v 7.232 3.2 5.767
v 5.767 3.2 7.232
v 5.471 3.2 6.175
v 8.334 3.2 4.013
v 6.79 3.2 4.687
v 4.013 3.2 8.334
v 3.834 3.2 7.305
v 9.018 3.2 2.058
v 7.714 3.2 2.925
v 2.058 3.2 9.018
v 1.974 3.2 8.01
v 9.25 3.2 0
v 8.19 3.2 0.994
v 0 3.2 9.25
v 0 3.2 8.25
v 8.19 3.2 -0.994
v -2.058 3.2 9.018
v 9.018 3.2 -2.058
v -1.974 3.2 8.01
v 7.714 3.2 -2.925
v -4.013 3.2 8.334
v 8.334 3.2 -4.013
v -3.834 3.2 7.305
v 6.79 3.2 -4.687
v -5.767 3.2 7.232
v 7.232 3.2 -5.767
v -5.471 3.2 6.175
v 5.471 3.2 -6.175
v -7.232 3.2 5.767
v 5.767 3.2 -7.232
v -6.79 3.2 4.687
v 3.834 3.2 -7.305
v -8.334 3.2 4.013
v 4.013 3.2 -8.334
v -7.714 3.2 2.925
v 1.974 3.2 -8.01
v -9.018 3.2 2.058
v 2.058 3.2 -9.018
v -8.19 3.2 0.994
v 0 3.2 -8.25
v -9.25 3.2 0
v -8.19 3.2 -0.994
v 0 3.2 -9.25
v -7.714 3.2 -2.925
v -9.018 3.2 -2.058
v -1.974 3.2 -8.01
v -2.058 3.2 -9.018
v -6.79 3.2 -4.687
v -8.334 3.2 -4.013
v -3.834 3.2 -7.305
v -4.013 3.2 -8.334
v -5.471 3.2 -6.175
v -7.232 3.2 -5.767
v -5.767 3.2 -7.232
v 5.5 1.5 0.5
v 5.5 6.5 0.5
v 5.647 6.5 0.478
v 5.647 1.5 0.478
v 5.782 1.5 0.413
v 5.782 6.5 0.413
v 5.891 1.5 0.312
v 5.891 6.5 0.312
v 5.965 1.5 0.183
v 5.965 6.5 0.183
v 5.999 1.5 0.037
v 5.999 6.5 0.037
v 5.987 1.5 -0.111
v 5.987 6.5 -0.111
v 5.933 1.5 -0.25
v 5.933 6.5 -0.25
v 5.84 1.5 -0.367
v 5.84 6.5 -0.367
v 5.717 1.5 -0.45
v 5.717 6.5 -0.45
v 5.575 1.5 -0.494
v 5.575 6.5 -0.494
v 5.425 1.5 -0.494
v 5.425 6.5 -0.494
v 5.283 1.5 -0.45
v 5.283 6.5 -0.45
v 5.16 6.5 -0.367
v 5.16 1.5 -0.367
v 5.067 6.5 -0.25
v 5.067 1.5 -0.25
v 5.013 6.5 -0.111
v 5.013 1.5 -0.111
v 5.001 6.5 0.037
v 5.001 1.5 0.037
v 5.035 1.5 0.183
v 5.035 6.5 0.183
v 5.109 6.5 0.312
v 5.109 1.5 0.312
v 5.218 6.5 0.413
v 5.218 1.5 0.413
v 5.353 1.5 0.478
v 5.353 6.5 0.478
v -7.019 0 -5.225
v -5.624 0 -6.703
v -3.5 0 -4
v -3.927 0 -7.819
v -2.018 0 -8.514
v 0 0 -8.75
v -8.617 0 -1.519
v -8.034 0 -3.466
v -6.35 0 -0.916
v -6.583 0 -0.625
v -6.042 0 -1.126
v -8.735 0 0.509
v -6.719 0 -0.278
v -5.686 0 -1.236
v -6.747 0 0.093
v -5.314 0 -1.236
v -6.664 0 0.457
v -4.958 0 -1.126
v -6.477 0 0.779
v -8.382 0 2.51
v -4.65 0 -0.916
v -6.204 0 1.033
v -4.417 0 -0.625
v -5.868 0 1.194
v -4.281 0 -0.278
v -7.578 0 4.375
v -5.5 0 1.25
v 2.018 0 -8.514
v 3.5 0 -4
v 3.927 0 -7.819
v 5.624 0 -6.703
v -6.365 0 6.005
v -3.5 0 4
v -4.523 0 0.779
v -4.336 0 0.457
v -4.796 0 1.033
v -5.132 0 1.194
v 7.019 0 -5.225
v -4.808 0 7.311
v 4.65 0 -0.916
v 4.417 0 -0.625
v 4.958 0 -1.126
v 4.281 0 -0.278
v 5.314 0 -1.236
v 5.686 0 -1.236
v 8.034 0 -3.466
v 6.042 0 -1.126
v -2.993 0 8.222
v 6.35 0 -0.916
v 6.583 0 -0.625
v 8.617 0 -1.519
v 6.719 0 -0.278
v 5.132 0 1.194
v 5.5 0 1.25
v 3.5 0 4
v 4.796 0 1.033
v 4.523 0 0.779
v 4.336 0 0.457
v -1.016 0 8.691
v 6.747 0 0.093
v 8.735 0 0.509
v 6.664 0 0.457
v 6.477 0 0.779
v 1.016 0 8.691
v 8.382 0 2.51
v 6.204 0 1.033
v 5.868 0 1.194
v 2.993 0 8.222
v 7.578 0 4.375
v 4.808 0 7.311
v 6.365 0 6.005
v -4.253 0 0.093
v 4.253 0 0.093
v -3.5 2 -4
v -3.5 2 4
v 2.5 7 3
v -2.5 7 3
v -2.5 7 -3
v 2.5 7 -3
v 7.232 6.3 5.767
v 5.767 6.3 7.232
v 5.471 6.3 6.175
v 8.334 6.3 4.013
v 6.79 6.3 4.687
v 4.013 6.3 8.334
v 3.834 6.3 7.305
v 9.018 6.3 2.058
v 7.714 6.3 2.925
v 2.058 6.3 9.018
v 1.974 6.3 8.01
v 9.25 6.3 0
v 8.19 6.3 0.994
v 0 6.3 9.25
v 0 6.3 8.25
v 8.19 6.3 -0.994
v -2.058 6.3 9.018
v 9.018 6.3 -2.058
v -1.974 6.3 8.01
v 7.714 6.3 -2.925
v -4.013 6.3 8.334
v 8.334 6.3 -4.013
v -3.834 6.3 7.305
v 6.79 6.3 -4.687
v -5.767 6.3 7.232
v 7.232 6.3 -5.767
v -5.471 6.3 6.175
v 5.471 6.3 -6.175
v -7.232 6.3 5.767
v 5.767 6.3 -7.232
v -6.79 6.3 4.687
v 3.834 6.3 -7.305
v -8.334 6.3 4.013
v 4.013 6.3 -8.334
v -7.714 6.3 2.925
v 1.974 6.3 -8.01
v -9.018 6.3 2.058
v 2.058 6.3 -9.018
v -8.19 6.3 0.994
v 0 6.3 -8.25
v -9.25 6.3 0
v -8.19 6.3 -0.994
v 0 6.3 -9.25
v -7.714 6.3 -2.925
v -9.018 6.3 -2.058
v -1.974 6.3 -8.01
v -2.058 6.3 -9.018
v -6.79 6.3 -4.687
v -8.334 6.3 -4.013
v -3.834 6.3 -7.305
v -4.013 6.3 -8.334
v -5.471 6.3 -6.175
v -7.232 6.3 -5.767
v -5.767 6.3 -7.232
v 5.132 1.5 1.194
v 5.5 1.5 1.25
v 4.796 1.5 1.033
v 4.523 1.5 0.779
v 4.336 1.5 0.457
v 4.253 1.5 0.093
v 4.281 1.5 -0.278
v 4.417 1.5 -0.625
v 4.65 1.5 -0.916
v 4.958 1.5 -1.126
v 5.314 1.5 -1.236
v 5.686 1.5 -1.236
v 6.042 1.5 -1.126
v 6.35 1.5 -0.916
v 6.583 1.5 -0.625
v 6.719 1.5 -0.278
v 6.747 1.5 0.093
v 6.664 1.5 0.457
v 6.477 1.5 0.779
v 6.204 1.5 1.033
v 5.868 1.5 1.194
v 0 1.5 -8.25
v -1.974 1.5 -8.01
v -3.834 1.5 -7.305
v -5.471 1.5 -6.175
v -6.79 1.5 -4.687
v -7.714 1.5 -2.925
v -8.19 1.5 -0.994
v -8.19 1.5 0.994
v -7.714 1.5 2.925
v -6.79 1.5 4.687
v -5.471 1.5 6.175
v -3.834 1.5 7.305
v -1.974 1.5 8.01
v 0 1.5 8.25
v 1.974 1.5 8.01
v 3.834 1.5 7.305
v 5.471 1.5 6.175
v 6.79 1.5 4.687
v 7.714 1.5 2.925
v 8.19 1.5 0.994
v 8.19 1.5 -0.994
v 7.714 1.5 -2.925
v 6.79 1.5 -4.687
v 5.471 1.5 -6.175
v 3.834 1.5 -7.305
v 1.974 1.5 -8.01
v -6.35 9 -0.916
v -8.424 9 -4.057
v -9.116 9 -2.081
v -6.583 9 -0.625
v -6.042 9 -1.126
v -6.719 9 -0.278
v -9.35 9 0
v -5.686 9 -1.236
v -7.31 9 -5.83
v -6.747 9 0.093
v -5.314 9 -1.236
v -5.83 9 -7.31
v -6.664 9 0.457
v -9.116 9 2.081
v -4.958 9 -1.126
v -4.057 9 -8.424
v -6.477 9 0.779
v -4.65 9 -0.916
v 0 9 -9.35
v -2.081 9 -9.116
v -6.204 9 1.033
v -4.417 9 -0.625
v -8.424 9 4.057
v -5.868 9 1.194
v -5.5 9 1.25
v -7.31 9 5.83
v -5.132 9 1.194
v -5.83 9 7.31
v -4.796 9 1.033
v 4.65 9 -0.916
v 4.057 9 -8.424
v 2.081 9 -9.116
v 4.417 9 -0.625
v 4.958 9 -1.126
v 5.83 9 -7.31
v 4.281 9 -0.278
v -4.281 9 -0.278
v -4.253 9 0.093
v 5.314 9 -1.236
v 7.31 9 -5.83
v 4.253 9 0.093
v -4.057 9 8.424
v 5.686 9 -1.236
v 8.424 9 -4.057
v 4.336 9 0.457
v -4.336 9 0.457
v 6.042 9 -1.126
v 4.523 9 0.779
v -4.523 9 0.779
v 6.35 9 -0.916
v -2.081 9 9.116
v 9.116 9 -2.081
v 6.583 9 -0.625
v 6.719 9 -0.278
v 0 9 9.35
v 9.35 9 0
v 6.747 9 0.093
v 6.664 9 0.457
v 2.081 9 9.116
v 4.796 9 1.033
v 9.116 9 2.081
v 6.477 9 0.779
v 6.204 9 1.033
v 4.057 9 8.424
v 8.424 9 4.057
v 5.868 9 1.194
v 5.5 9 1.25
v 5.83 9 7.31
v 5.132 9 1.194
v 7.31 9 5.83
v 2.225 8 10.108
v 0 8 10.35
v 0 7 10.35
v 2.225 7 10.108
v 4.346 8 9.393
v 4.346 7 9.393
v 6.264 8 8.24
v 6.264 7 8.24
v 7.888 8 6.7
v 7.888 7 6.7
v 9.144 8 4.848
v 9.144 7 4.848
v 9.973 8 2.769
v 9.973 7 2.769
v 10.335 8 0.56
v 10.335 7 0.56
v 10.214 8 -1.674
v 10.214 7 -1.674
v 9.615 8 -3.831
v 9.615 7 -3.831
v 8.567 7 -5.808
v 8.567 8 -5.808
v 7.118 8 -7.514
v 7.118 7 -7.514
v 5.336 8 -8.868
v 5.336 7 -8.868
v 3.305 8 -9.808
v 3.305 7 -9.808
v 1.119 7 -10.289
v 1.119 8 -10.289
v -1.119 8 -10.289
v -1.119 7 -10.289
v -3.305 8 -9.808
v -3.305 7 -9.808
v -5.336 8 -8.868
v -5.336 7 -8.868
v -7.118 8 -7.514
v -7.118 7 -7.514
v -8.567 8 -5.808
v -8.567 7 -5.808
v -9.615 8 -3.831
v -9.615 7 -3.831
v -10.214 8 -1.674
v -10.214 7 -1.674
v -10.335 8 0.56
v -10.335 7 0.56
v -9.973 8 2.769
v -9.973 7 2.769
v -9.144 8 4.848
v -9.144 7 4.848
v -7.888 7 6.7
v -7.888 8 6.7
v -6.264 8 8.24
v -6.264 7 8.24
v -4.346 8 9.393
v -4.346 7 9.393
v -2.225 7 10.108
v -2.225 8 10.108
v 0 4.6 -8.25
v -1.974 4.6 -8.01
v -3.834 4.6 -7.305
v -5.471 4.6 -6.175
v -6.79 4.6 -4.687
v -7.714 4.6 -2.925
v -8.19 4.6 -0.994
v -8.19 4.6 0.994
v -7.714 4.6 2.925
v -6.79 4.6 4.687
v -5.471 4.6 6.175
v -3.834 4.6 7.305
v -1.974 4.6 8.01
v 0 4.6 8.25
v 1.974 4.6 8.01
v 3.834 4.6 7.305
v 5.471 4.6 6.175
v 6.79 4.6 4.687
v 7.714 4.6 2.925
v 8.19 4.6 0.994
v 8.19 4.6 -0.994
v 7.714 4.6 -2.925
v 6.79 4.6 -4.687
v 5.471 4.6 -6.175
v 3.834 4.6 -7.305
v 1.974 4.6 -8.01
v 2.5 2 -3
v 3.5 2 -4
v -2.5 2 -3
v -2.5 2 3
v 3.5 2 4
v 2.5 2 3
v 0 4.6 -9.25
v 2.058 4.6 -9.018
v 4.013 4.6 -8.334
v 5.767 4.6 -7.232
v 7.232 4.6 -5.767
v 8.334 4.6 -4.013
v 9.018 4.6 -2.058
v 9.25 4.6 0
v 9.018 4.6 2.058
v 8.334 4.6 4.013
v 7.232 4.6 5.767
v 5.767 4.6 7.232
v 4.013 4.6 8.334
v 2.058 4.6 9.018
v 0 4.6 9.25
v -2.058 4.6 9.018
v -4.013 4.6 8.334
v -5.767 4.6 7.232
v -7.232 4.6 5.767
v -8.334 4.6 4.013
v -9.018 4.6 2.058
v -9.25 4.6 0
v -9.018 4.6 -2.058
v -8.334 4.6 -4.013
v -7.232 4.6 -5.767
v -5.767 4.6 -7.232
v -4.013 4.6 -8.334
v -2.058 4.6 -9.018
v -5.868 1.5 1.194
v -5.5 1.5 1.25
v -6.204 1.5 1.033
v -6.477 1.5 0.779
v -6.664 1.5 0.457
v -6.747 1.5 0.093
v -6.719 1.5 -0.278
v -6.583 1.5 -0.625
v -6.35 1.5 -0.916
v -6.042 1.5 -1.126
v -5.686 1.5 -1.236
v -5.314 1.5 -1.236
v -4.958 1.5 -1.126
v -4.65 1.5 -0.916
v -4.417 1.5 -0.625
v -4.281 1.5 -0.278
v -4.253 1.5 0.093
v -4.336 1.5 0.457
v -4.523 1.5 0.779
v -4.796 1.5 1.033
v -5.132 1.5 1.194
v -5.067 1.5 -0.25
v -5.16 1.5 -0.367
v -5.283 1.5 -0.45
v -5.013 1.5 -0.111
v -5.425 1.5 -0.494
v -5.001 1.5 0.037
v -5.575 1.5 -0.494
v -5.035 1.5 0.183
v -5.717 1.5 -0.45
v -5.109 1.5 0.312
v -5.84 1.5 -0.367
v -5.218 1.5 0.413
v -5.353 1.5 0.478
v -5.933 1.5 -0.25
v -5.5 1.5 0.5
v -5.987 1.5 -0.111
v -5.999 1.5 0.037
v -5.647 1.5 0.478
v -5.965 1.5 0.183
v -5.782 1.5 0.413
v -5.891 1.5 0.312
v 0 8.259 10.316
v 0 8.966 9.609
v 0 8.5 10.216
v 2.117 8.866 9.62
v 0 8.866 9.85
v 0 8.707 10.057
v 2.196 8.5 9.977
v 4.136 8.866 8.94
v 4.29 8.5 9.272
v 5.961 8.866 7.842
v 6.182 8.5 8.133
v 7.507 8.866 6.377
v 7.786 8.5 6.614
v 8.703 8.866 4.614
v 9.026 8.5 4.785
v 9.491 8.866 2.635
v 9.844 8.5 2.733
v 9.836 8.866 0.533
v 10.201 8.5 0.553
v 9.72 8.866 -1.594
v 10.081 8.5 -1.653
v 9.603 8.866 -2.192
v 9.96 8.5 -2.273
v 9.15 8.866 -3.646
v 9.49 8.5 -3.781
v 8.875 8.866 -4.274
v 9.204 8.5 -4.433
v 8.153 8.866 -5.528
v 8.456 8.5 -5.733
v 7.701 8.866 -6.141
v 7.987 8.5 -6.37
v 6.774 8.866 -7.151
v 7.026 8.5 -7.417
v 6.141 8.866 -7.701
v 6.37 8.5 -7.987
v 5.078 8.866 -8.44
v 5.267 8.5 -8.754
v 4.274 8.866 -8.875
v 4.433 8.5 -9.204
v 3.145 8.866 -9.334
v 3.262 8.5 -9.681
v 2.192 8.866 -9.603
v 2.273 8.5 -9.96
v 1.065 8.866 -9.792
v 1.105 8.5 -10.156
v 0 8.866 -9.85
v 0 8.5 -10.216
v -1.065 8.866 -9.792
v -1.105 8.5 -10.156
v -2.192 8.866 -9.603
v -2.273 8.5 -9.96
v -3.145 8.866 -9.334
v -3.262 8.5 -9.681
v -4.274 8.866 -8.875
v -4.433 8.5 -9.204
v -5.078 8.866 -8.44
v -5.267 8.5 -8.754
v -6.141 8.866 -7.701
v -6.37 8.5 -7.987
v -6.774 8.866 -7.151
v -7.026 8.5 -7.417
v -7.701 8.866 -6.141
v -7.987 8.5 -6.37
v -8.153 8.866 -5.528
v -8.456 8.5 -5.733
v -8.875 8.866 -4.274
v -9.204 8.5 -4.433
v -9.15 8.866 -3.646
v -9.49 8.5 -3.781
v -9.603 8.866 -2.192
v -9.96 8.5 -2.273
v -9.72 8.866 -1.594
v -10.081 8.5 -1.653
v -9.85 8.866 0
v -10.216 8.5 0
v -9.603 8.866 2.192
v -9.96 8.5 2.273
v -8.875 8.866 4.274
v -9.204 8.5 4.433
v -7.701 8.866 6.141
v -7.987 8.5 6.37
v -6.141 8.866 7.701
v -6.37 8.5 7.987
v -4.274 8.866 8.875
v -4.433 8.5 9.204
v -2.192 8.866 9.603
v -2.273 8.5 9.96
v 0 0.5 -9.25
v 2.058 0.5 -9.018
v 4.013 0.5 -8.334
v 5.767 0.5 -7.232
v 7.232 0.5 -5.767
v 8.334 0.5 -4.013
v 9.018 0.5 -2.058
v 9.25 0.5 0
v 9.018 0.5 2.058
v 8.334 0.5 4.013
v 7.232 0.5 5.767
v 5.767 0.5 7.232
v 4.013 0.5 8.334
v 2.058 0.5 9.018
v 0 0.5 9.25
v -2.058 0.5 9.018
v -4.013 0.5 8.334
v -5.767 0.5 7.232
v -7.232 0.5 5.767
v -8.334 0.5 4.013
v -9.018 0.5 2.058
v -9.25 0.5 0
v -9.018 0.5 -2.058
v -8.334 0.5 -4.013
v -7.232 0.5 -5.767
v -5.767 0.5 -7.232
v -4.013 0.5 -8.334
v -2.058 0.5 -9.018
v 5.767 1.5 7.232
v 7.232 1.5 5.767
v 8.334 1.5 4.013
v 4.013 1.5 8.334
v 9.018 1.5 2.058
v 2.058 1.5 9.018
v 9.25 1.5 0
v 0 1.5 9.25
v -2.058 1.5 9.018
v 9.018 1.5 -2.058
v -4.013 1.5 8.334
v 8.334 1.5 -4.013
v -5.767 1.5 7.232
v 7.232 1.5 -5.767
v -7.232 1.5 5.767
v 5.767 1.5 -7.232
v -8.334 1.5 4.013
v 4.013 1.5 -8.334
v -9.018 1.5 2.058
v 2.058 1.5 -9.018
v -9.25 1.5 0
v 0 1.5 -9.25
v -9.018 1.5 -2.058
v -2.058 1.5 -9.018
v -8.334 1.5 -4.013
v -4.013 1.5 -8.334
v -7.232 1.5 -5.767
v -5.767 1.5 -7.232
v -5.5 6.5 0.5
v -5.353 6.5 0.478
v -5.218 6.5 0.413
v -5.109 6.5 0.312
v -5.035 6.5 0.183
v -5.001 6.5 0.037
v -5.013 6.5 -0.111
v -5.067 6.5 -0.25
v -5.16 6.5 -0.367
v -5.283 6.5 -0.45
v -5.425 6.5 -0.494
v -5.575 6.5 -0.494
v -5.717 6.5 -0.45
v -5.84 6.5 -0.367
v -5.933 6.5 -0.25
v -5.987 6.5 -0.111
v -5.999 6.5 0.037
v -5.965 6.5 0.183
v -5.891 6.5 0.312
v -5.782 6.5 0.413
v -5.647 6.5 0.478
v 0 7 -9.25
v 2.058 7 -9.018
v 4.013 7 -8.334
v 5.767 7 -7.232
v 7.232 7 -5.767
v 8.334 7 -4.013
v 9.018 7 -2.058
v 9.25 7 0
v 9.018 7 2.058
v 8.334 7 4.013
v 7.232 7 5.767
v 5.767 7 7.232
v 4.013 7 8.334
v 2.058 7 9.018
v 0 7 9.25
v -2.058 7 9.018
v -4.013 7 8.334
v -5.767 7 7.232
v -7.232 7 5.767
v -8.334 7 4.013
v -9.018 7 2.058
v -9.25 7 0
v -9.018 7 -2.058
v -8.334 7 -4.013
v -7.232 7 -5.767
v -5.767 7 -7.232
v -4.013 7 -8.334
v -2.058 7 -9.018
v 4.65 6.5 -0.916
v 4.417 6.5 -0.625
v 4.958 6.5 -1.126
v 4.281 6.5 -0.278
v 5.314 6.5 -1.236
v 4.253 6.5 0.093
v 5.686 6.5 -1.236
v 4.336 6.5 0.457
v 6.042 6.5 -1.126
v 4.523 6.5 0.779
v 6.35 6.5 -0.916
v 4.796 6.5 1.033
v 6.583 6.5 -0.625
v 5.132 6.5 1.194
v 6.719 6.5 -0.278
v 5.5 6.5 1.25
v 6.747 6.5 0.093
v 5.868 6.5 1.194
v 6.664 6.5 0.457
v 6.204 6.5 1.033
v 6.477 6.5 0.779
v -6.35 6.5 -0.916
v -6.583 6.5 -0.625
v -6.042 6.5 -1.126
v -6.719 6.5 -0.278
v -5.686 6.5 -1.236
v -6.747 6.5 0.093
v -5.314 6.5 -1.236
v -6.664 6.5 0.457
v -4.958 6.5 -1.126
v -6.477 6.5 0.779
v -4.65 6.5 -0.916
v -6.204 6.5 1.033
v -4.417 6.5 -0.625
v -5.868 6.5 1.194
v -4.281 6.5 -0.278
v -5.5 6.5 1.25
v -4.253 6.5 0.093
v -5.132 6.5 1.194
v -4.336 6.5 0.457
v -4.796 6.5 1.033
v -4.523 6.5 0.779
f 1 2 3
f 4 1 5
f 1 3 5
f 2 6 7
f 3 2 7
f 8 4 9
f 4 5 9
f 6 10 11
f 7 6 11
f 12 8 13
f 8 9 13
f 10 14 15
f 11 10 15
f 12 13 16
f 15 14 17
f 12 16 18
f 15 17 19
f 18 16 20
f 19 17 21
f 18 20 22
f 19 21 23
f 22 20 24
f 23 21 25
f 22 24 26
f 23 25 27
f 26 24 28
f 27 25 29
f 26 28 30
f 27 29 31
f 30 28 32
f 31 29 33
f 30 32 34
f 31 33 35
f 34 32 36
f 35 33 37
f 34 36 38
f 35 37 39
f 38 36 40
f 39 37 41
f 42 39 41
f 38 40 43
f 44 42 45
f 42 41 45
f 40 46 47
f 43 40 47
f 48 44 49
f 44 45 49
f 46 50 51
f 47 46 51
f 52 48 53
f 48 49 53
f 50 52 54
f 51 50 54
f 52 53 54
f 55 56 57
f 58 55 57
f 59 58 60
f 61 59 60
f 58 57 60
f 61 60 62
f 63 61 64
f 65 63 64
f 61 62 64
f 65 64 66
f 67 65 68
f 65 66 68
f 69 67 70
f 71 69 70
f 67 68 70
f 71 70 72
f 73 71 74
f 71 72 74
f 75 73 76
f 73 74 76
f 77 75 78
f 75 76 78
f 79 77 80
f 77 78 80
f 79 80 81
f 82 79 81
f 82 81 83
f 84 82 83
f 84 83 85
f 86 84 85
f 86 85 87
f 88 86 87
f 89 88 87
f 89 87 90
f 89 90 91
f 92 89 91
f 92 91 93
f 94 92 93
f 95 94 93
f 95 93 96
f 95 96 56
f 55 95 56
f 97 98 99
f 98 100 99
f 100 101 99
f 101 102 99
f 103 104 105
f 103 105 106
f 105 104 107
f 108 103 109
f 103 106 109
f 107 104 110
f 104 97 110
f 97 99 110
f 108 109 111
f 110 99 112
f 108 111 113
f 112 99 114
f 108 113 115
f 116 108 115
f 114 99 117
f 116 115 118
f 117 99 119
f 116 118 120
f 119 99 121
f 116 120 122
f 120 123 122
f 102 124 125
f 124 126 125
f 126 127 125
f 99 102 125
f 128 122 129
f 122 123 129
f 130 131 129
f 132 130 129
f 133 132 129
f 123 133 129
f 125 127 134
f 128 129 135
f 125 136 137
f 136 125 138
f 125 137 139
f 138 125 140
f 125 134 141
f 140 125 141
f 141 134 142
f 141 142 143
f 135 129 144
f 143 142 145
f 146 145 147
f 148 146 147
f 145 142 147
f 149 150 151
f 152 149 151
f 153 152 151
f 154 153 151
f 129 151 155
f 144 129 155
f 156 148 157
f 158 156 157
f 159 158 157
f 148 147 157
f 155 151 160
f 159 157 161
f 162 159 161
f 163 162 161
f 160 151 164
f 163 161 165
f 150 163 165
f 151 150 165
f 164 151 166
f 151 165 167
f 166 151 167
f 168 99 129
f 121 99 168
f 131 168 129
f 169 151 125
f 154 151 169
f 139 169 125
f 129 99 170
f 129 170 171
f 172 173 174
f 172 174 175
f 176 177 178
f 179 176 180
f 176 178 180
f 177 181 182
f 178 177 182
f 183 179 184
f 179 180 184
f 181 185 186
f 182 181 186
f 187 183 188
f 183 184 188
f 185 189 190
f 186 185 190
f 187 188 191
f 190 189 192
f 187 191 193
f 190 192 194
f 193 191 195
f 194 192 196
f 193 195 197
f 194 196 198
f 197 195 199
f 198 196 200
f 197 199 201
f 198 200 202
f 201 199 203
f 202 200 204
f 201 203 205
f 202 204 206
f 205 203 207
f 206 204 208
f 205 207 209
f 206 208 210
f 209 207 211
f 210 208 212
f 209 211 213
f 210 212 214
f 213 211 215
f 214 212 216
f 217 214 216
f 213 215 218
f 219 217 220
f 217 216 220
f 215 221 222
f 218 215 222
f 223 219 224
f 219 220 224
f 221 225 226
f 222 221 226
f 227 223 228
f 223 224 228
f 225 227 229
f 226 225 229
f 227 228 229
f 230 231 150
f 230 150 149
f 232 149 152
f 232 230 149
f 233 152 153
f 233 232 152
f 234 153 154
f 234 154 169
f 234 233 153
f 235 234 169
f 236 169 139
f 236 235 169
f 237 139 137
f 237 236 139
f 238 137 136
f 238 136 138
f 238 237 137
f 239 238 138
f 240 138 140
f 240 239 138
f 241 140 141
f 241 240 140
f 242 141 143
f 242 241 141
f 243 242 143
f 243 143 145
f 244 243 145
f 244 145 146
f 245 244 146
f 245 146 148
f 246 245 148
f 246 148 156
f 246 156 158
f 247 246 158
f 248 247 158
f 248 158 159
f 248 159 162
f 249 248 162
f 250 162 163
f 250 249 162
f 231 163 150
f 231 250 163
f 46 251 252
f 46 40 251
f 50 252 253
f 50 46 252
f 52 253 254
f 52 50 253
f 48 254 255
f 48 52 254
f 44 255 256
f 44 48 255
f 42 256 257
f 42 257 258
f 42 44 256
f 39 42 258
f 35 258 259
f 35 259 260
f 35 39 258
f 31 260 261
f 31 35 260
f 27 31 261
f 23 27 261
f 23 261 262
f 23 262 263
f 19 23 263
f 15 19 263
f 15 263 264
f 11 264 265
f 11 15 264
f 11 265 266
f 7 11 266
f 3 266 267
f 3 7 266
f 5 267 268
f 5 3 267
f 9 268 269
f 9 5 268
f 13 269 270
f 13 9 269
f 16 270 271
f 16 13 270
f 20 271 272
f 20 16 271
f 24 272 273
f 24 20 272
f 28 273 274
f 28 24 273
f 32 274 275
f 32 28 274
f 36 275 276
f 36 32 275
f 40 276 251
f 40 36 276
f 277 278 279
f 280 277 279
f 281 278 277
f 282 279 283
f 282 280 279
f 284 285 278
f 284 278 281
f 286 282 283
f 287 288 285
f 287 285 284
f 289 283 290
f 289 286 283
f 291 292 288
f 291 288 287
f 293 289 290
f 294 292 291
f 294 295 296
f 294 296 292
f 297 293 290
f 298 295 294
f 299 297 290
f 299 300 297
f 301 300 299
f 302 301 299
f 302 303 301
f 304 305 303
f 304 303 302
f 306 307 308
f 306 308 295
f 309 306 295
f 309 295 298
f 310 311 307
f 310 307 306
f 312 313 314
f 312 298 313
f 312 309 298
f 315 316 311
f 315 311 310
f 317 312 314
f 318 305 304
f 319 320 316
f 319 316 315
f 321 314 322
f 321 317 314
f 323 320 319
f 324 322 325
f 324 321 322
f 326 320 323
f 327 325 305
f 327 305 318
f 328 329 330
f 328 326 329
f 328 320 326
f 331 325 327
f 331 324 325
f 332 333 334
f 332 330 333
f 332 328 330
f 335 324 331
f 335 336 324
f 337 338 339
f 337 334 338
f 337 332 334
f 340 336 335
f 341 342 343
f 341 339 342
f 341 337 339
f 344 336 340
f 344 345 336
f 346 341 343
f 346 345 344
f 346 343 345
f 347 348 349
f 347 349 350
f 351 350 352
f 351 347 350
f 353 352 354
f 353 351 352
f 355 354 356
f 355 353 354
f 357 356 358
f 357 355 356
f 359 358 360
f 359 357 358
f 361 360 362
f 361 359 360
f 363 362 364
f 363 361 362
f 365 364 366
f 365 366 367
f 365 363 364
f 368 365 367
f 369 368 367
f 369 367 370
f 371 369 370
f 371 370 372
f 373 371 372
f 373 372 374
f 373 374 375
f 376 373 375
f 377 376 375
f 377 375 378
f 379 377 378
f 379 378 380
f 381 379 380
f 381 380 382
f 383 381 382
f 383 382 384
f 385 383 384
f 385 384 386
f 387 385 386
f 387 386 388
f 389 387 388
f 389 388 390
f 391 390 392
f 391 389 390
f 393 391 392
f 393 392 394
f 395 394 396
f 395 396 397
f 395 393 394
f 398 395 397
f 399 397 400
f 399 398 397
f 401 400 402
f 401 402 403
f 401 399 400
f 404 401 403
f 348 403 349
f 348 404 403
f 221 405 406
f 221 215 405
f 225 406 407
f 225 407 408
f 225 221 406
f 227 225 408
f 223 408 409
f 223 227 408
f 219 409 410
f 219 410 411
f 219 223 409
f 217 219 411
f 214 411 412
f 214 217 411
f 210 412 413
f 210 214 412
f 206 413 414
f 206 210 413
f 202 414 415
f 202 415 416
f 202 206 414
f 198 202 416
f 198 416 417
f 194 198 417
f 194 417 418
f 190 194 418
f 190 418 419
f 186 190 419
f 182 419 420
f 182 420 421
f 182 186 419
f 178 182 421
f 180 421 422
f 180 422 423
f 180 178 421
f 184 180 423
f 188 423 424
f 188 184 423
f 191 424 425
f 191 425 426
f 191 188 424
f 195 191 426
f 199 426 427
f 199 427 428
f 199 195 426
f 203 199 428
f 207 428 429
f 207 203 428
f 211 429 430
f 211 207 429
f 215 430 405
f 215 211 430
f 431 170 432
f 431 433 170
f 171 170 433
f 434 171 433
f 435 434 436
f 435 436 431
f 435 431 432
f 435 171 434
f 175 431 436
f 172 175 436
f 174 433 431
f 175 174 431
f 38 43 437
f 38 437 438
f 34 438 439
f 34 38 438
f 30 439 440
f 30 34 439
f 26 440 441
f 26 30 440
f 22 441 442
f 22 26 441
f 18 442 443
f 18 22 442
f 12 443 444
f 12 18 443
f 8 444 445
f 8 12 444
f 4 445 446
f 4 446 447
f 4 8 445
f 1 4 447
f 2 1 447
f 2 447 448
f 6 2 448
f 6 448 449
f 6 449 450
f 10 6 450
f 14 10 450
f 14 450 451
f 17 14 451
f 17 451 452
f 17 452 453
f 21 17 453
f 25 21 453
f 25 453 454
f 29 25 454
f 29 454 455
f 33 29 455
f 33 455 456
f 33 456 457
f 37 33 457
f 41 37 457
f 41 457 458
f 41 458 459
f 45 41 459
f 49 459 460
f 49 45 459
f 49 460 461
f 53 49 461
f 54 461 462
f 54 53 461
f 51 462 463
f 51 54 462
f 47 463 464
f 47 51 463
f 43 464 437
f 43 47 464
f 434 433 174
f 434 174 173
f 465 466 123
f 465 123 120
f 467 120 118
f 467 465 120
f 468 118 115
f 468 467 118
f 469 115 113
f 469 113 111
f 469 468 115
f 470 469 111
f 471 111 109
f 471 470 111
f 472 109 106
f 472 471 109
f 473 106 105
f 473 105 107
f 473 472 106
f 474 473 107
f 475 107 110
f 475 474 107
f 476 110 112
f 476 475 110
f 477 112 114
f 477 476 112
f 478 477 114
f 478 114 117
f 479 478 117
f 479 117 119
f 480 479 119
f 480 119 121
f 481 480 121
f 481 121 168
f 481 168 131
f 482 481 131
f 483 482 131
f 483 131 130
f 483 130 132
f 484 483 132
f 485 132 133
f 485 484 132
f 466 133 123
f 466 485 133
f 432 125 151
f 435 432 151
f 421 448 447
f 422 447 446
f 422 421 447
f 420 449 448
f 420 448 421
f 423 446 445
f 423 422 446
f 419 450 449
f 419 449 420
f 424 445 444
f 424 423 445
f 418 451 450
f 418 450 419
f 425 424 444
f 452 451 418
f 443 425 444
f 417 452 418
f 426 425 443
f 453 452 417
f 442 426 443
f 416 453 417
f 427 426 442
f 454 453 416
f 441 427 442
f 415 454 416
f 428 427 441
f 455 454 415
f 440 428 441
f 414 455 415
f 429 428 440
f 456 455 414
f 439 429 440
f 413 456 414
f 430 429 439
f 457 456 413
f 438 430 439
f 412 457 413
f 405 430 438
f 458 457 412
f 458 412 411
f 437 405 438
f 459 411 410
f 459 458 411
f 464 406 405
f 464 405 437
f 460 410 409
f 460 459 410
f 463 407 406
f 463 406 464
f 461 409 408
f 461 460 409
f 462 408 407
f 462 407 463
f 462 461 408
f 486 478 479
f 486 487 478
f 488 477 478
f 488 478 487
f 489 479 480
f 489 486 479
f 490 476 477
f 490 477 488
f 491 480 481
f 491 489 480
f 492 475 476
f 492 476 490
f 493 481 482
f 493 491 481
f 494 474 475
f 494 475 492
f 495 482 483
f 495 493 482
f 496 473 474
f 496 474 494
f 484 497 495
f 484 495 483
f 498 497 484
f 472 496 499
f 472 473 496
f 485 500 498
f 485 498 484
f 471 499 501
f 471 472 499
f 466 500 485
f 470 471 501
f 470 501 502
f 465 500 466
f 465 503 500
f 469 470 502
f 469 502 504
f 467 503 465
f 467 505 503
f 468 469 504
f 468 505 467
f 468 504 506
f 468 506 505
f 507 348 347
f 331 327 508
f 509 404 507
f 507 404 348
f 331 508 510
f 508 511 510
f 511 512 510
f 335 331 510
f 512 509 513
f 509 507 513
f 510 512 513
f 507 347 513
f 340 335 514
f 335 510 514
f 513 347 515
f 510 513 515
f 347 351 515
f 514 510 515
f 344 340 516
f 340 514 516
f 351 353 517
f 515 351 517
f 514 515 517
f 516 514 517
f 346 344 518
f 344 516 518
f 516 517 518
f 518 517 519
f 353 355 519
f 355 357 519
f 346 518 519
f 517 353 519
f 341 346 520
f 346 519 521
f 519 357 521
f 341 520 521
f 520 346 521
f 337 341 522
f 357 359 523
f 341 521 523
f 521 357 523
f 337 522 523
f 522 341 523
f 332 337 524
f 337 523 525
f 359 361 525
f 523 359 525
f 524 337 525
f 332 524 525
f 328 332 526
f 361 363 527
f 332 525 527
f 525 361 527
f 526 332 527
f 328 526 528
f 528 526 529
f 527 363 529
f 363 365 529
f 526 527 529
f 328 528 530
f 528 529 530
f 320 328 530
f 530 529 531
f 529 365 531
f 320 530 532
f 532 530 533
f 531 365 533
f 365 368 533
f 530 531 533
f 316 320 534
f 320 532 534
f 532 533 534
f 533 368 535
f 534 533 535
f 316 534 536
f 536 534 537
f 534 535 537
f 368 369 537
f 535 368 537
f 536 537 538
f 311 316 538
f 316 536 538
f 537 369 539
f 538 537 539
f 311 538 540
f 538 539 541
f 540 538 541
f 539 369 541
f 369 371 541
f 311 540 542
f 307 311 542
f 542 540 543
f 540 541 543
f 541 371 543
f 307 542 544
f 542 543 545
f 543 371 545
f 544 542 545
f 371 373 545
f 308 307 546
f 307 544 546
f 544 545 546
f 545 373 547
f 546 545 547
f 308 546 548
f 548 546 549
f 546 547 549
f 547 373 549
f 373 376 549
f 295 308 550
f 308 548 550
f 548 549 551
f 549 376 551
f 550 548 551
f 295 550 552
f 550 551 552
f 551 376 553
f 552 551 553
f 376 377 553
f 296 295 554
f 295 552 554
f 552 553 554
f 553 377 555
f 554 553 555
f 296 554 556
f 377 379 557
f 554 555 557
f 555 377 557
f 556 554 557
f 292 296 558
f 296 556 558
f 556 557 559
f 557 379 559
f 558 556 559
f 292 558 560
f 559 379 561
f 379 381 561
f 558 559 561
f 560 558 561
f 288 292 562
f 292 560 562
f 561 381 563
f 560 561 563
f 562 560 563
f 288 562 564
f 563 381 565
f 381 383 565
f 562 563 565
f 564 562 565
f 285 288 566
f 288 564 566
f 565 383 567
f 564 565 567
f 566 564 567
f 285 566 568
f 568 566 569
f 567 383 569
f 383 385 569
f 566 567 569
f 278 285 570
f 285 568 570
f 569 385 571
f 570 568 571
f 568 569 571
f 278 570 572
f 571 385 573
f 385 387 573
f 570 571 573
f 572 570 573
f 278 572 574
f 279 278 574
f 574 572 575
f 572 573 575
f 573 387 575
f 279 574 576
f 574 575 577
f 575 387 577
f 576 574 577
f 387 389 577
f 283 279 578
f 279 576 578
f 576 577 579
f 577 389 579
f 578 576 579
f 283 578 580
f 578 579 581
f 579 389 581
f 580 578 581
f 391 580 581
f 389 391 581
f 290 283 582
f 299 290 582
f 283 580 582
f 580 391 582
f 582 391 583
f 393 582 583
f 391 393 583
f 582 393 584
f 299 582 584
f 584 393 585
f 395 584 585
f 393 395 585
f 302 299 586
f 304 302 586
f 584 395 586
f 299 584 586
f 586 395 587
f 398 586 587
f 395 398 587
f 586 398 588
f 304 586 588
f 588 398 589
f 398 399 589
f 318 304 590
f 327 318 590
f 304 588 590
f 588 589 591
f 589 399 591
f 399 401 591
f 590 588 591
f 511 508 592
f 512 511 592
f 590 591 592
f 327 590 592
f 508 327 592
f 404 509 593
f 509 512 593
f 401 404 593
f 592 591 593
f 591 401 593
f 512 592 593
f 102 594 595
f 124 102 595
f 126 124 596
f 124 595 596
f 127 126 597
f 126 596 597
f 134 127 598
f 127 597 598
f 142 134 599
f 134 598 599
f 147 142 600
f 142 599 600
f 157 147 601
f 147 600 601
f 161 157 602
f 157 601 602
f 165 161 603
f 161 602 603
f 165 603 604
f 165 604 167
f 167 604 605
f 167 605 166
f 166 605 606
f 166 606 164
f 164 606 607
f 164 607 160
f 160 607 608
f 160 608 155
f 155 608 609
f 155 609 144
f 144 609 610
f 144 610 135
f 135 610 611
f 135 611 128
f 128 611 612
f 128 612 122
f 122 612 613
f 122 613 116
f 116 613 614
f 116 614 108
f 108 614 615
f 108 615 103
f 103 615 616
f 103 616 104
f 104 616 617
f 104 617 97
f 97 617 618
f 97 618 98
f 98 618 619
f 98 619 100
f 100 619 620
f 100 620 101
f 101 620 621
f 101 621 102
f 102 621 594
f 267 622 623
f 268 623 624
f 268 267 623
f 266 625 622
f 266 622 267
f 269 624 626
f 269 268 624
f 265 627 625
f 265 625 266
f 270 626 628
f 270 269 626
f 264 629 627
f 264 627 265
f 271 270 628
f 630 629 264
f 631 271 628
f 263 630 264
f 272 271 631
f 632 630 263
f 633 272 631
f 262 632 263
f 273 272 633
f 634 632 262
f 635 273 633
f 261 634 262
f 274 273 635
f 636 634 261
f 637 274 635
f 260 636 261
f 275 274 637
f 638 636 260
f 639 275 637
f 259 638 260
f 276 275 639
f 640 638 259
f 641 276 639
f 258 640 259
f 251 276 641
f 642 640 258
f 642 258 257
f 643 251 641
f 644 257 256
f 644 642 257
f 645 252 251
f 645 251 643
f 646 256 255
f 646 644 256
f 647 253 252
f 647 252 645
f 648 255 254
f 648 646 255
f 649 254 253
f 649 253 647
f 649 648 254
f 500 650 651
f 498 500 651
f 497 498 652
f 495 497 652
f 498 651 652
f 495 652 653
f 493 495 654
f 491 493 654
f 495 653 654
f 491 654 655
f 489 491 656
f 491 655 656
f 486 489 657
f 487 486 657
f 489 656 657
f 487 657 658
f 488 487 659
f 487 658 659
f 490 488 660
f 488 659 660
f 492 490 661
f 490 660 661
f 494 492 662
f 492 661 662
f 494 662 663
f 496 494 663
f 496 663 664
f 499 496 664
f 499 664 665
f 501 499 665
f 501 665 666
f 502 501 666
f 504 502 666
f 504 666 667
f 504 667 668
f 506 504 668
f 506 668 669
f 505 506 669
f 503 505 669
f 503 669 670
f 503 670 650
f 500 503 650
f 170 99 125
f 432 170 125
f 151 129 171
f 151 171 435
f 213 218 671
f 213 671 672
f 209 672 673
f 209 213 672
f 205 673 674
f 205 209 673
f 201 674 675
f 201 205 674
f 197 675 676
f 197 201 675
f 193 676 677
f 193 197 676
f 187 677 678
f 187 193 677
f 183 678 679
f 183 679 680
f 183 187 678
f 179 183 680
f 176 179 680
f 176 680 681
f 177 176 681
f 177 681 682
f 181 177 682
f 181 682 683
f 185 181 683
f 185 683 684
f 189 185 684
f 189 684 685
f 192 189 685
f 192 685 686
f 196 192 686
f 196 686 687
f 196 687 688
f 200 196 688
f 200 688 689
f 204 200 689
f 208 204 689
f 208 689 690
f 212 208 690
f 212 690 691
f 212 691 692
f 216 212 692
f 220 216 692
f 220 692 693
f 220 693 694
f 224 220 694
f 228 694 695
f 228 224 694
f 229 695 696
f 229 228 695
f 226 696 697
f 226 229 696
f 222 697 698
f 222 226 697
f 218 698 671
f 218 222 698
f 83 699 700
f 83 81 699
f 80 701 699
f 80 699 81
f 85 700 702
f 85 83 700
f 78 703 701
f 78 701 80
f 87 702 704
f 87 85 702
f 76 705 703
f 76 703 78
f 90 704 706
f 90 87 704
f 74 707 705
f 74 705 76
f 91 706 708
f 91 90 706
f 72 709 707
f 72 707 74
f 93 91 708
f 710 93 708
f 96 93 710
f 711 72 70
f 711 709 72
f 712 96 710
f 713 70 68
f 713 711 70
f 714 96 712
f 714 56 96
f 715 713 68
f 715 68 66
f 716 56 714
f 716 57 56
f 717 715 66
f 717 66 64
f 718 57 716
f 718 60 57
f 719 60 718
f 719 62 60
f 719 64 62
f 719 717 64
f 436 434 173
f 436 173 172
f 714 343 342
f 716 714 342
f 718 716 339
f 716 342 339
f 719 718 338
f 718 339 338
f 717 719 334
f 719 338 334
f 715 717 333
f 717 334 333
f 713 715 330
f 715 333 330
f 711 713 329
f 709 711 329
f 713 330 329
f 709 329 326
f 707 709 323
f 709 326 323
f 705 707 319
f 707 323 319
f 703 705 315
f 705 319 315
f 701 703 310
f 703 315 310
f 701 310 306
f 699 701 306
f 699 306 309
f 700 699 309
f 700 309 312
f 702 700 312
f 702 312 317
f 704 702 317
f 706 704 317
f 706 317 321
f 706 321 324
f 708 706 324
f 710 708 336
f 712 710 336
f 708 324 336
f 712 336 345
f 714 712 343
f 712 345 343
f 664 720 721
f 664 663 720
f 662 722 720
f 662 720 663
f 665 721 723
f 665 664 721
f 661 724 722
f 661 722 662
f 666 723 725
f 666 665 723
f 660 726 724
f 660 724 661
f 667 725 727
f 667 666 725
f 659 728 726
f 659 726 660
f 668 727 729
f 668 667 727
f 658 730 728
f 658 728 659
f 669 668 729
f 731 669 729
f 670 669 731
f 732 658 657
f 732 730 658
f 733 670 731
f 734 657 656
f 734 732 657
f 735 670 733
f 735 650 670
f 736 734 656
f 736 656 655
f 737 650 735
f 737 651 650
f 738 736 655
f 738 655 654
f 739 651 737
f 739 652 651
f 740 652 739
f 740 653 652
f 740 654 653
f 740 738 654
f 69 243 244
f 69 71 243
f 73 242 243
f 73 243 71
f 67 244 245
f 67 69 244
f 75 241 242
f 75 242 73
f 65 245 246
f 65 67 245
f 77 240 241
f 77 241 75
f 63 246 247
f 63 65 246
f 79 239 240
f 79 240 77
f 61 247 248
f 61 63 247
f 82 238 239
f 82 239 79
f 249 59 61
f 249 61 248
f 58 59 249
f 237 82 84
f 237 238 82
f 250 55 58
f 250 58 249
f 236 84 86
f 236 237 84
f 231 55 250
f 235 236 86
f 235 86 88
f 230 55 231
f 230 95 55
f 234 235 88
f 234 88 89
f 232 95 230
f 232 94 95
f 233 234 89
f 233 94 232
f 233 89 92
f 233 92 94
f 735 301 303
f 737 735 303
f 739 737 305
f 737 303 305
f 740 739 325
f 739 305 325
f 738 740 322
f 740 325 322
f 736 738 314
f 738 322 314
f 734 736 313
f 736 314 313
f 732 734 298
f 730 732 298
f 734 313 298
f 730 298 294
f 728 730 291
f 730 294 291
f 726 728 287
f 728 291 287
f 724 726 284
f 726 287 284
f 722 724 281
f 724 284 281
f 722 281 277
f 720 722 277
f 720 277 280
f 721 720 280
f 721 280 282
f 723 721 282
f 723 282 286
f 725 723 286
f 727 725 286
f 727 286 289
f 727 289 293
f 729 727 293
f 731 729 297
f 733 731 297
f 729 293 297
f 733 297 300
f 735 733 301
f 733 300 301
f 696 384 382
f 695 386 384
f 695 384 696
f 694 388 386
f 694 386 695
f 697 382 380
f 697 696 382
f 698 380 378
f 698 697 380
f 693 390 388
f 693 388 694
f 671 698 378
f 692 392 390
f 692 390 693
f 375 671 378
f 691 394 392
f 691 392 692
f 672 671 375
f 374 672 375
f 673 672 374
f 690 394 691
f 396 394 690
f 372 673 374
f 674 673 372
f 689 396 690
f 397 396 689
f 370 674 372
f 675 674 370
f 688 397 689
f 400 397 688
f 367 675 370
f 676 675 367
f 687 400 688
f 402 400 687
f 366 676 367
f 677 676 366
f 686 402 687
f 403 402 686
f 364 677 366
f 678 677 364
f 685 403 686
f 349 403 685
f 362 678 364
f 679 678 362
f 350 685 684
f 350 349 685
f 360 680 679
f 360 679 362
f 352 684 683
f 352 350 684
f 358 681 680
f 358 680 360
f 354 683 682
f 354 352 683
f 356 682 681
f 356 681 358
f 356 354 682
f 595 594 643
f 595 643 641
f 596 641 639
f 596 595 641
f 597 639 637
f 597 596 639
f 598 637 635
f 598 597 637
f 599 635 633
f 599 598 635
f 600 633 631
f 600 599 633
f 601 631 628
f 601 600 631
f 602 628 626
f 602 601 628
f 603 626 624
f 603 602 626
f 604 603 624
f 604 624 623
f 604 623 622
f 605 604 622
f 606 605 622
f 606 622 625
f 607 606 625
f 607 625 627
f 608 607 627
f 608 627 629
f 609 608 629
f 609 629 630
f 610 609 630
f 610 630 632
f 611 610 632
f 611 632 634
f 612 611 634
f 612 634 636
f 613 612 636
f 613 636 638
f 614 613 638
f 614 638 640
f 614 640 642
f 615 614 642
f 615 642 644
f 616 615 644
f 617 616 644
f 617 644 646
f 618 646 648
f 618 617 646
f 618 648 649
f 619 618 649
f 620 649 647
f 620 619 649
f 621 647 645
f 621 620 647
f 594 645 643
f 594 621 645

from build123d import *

# Parameters (mm, degrees)
SKETCH_1_R          = 11
EXTRUDE_1_DEPTH     = 9
SKETCH_2_R          = 0.5
CUT_EXTRUDE_1_DEPTH = 18.972200756
SKETCH_3_R          = 16.549134696
SKETCH_3_R_2        = 9.25
CUT_EXTRUDE_2_DEPTH = 7
SKETCH_4_W          = 2
SKETCH_4_H          = 1.7
SKETCH_5_W          = 5
SKETCH_5_H          = 6
CUT_EXTRUDE_3_DEPTH = 7
SKETCH_6_R          = 1.4
CUT_EXTRUDE_4_DEPTH = 7
SKETCH_7_R          = 1.25
CUT_EXTRUDE_5_DEPTH = 2.5
CUT_EXTRUDE_START   = -1.5
SKETCH_8_R          = 1.25
CUT_EXTRUDE_6_DEPTH = 1.5
SKETCH_9_W          = 7
SKETCH_9_H          = 8
SKETCH_9_W_2        = 5
SKETCH_9_H_2        = 6
CUT_EXTRUDE_7_DEPTH = 2
CHAMFER_1_SIZE      = 0.5
SKETCH_10_R         = 12.5
SKETCH_10_R_2       = 10.35
CUT_EXTRUDE_8_DEPTH = 10
FILLET_1_R          = 1
SKETCH_11_R         = 1.953999565
EXTRUDE_2_DEPTH     = 2


with BuildPart() as part:
    # 草图1 → 凸台-拉伸1 (new body)
    with BuildSketch(Plane(origin=(0, 0, 0), x_dir=(1, 0, 0), z_dir=(0, 1, 0))):
        with Locations(Location((0, 0, 0), (0, 0, 270))):
            Circle(SKETCH_1_R)
    extrude(amount=EXTRUDE_1_DEPTH)

    # 草图2 → 切除-拉伸1 (cut, through all)
    with BuildSketch(Plane(origin=(0, 9, 0), x_dir=(1, 0, 0), z_dir=(0, 1, 0))):
        with Locations(Location((-5.5, 0, 0), (0, 0, 270))):
            Circle(SKETCH_2_R)
        with Locations(Location((5.5, 0, 0), (0, 0, 270))):
            Circle(SKETCH_2_R)
    extrude(amount=-CUT_EXTRUDE_1_DEPTH, mode=Mode.SUBTRACT)

    # 草图3 → 切除-拉伸2 (cut)
    with BuildSketch(Plane.XZ):
        Circle(SKETCH_3_R)
        with Locations(Location((0, 0, 0), (0, 0, 270))):
            Circle(SKETCH_3_R_2, mode=Mode.SUBTRACT)
    extrude(amount=-CUT_EXTRUDE_2_DEPTH, mode=Mode.SUBTRACT)

    # 草图4 → 切除-旋转1 (revolve, cut)
    with BuildSketch(Plane.XY, mode=Mode.PRIVATE) as cut_revolve_1_sk:
        with Locations((-9.25, 5.45)):
            Rectangle(SKETCH_4_W, SKETCH_4_H)
        with Locations((-9.25, 2.35)):
            Rectangle(SKETCH_4_W, SKETCH_4_H)
    revolve(cut_revolve_1_sk.sketch.rotate(Axis((0, 0, 0), (0, 1, 0)), 270), axis=Axis((0, 0, 0), (0, 1, 0)), mode=Mode.SUBTRACT)

    # 草图5 → 切除-拉伸3 (cut)
    with BuildSketch(Plane.XZ):
        Rectangle(SKETCH_5_W, SKETCH_5_H)
    extrude(amount=-CUT_EXTRUDE_3_DEPTH, mode=Mode.SUBTRACT)

    # 草图6 → 切除-拉伸4 (cut)
    with BuildSketch(Plane(origin=(0, 9, 0), x_dir=(1, 0, 0), z_dir=(0, 1, 0))):
        with Locations(Location((0, 0, 0), (0, 0, 270))):
            Circle(SKETCH_6_R)
    extrude(amount=-CUT_EXTRUDE_4_DEPTH, mode=Mode.SUBTRACT)

    # 草图7 → 切除-拉伸5 (cut)
    with BuildSketch(Plane(origin=(0, 9, 0), x_dir=(1, 0, 0), z_dir=(0, 1, 0))):
        with Locations(Location((-5.5, 0, 0), (0, 0, 270))):
            Circle(SKETCH_7_R)
        with Locations(Location((5.5, 0, 0), (0, 0, 270))):
            Circle(SKETCH_7_R)
    extrude(amount=-CUT_EXTRUDE_5_DEPTH, mode=Mode.SUBTRACT)

    # 草图8 → 切除-拉伸6 (cut)
    with BuildSketch(Plane.XZ.offset(CUT_EXTRUDE_START)):
        with Locations(Location((-5.5, 0, 0), (0, 0, 90))):
            Circle(SKETCH_8_R)
        with Locations(Location((5.5, 0, 0), (0, 0, 90))):
            Circle(SKETCH_8_R)
    extrude(amount=CUT_EXTRUDE_6_DEPTH, mode=Mode.SUBTRACT)

    # 草图9 → 切除-拉伸7 (cut)
    with BuildSketch(Plane.XZ):
        Rectangle(SKETCH_9_W, SKETCH_9_H)
        Rectangle(SKETCH_9_W_2, SKETCH_9_H_2, mode=Mode.SUBTRACT)
    extrude(amount=-CUT_EXTRUDE_7_DEPTH, mode=Mode.SUBTRACT)

    # 倒角1
    chamfer_1_edges = [part.edges().sort_by_distance(p)[0] for p in [
        (0, 0, 9.25),
    ]]
    chamfer(chamfer_1_edges, length=CHAMFER_1_SIZE)

    # 草图10 → 切除-拉伸8 (cut)
    with BuildSketch(Plane(origin=(0, 9, 0), x_dir=(1, 0, 0), z_dir=(0, 1, 0))):
        Circle(SKETCH_10_R)
        with Locations(Location((0, 0, 0), (0, 0, 270))):
            Circle(SKETCH_10_R_2, mode=Mode.SUBTRACT)
    extrude(amount=-CUT_EXTRUDE_8_DEPTH, mode=Mode.SUBTRACT)

    # 圆角1
    fillet_1_edges = [part.edges().sort_by_distance(p)[0] for p in [
        (0, 9, -10.35),
    ]]
    fillet(fillet_1_edges, radius=FILLET_1_R)

    # 草图11 → 凸台-拉伸2 (add)
    with BuildSketch(Plane(origin=(0, 9, 0), x_dir=(1, 0, 0), z_dir=(0, 1, 0))):
        Circle(SKETCH_11_R)
    extrude(amount=-EXTRUDE_2_DEPTH)


solid = part.part
